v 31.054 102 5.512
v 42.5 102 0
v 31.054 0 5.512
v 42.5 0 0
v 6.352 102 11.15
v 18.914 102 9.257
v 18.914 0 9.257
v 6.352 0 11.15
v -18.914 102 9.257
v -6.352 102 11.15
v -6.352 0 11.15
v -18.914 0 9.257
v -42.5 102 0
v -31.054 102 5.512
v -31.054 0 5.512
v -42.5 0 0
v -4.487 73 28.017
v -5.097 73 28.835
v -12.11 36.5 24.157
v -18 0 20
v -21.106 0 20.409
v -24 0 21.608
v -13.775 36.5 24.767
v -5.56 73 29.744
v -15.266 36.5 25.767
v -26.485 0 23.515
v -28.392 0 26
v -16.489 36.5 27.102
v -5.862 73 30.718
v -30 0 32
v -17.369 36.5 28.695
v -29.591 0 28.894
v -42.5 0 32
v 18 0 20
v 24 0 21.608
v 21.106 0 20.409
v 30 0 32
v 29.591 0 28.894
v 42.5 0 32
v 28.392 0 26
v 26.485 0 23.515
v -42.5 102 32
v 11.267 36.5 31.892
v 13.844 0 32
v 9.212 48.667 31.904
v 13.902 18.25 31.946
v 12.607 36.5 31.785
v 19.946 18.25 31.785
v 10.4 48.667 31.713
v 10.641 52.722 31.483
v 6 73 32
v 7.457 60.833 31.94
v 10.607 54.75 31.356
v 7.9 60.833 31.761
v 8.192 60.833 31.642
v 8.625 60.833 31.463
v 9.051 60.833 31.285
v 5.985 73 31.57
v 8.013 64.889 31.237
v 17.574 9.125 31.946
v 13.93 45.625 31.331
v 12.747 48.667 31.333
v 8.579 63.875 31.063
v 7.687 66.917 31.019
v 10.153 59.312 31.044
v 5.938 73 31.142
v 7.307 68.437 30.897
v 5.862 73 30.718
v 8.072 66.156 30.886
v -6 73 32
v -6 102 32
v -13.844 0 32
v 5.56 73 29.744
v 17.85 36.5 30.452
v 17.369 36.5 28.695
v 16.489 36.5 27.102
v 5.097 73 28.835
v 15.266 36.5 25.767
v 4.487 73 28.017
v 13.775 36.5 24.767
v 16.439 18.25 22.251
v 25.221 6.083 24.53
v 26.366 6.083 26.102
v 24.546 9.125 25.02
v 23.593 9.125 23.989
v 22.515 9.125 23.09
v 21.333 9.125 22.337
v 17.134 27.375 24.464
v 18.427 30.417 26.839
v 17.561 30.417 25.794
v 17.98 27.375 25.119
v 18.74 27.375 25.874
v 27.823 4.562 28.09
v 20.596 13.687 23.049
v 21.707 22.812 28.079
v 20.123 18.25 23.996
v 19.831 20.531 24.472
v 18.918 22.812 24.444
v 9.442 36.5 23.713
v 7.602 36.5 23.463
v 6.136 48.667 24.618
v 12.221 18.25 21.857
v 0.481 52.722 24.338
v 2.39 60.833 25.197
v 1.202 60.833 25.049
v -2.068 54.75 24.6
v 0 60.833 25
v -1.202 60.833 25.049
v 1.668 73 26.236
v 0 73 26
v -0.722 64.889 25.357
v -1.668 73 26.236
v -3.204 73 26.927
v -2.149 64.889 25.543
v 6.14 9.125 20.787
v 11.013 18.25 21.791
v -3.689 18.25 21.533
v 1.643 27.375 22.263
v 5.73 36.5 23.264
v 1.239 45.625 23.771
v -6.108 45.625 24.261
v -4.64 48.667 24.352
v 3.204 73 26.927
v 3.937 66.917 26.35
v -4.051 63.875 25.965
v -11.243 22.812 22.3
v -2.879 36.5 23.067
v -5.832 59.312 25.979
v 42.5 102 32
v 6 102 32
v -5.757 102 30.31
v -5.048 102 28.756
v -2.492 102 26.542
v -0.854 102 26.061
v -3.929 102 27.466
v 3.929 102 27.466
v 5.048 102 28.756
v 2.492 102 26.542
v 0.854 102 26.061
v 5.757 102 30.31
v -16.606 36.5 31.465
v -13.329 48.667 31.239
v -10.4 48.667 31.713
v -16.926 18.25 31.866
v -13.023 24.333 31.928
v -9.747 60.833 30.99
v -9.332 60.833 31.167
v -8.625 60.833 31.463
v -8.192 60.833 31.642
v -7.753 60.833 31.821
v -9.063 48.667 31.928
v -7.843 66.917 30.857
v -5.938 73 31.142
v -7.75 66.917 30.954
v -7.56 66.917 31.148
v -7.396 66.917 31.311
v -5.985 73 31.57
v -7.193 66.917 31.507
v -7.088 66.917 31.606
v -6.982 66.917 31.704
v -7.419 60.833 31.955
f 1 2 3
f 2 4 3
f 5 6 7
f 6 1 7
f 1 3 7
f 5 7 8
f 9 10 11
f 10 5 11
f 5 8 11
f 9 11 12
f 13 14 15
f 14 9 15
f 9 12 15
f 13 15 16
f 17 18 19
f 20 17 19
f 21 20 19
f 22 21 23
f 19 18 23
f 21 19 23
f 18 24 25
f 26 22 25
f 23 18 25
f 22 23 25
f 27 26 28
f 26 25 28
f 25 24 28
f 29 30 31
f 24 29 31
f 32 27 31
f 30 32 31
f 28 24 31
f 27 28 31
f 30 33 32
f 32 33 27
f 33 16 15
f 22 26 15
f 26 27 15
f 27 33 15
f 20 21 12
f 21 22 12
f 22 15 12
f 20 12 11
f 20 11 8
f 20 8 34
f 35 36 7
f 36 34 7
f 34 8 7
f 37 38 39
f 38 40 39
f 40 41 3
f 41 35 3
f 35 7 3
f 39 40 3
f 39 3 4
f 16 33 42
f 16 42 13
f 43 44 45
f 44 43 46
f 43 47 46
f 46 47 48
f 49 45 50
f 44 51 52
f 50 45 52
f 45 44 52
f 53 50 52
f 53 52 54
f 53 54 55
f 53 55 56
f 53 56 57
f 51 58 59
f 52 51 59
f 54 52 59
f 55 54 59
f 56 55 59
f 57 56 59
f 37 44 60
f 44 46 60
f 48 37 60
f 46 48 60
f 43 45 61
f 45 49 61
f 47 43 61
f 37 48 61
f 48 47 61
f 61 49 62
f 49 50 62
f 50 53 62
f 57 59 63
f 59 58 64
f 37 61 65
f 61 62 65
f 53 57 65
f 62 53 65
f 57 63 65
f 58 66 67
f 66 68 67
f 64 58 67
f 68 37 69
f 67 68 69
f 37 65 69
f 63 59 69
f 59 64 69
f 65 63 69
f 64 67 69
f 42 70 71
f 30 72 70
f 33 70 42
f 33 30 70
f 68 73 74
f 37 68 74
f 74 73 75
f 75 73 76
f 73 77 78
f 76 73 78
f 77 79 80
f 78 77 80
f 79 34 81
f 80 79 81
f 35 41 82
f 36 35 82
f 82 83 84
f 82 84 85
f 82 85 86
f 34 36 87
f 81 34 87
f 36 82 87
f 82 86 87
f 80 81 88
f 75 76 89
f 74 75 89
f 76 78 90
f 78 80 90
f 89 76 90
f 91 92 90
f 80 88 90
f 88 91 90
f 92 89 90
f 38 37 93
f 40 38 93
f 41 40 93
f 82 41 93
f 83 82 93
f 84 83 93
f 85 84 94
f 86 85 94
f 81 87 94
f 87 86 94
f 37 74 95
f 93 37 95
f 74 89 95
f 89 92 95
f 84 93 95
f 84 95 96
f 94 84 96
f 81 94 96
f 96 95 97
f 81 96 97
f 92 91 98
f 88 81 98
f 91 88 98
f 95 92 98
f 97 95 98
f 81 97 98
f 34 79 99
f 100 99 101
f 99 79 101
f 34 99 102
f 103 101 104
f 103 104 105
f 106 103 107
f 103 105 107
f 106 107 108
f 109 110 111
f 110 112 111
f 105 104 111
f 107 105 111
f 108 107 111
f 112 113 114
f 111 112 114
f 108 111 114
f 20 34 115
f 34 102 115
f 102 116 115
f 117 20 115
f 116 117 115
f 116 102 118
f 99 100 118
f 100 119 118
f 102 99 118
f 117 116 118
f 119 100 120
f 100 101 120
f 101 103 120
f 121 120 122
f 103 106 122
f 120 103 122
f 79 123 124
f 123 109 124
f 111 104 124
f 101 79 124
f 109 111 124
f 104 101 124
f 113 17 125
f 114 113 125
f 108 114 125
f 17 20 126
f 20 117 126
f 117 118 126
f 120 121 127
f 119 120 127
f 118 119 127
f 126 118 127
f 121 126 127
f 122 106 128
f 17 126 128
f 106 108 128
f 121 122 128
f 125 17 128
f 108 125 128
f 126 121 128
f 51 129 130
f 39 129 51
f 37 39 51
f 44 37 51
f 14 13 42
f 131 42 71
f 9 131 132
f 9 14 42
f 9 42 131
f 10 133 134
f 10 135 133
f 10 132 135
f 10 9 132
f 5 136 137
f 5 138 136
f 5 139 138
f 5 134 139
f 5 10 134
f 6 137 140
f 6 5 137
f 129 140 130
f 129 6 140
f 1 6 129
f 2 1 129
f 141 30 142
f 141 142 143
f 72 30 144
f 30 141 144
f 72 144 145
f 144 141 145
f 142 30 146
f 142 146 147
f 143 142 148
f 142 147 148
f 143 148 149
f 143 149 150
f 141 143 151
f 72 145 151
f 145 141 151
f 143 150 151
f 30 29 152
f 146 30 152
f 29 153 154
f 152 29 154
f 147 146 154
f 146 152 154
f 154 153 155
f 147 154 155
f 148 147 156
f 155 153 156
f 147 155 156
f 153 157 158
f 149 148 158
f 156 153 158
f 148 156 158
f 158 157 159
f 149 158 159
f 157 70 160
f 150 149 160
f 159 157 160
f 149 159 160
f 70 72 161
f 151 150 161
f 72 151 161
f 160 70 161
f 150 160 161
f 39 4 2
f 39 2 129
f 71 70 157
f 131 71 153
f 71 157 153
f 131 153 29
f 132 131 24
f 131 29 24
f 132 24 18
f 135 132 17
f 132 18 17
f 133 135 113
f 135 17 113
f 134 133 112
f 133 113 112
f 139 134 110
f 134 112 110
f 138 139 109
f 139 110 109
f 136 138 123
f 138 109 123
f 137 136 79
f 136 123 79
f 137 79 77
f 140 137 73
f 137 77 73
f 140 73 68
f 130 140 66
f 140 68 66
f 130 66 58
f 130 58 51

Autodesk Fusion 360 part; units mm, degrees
sketch "Sketch1" plane through (0, 0, 0) normal (0, 1, 0) x (1, 0, 0)
  line L0 (-42.5, 0) -> (42.5, 0)
  line L1 (42.5, 0) -> (42.5, -32)
  line L2 (42.5, -32) -> (-42.5, -32)
  line L3 (-42.5, -32) -> (-42.5, 0)
  arc A0 (-42.5, 0) -> (42.5, 0) centre (0, 73.6122) ccw
  line L4 (-30, -32) -> (30, -32)
  line L5 (18, -20) -> (-18, -20)
  arc A1 (-18, -20) -> (-30, -32) centre (-18, -32) ccw
  arc A2 (30, -32) -> (18, -20) centre (18, -32) ccw
  arc A3 (6, -32) -> (-6, -32) centre (0, -32) ccw
  dimension "d1" = 42.5
  dimension "d2" = 42.5
  dimension "d3" = 32
  dimension "d4" = 32
  dimension "d5" = 170
  dimension "d6" = 20
  dimension "d9" = 12
  dimension "d10" = 12
  dimension "d11" = 30
  dimension "d12" = 30
  dimension "d13" = 12
  dimension "d14" = 42.5
extrude "Extrude1" add sketch "Sketch1" along normal blind 102 contours L1 L2 L3 A0 L5 A1 A2 | L2 L4 L5 A1 A2 A3
extrude "Extrude2" add sketch "Sketch1" along normal blind 73 contours L2 L4 A3
loft "Loft1" cut profiles "Sketch1" section 1 contours L2 L4 L5 A1 A2 A3 | L2 L4 A3 section 2 face at (-0.1495, 73, 30.0056)
equation "d1 = ( 85 / 2 ) * 1 mm"
equation "d2 = ( 85 / 2 ) * 1 mm"
equation "d5 = ( 85 * 2 ) * 1 mm"
equation "d14 = d2"
equation "d17 = 102 mm - 29 mm"
